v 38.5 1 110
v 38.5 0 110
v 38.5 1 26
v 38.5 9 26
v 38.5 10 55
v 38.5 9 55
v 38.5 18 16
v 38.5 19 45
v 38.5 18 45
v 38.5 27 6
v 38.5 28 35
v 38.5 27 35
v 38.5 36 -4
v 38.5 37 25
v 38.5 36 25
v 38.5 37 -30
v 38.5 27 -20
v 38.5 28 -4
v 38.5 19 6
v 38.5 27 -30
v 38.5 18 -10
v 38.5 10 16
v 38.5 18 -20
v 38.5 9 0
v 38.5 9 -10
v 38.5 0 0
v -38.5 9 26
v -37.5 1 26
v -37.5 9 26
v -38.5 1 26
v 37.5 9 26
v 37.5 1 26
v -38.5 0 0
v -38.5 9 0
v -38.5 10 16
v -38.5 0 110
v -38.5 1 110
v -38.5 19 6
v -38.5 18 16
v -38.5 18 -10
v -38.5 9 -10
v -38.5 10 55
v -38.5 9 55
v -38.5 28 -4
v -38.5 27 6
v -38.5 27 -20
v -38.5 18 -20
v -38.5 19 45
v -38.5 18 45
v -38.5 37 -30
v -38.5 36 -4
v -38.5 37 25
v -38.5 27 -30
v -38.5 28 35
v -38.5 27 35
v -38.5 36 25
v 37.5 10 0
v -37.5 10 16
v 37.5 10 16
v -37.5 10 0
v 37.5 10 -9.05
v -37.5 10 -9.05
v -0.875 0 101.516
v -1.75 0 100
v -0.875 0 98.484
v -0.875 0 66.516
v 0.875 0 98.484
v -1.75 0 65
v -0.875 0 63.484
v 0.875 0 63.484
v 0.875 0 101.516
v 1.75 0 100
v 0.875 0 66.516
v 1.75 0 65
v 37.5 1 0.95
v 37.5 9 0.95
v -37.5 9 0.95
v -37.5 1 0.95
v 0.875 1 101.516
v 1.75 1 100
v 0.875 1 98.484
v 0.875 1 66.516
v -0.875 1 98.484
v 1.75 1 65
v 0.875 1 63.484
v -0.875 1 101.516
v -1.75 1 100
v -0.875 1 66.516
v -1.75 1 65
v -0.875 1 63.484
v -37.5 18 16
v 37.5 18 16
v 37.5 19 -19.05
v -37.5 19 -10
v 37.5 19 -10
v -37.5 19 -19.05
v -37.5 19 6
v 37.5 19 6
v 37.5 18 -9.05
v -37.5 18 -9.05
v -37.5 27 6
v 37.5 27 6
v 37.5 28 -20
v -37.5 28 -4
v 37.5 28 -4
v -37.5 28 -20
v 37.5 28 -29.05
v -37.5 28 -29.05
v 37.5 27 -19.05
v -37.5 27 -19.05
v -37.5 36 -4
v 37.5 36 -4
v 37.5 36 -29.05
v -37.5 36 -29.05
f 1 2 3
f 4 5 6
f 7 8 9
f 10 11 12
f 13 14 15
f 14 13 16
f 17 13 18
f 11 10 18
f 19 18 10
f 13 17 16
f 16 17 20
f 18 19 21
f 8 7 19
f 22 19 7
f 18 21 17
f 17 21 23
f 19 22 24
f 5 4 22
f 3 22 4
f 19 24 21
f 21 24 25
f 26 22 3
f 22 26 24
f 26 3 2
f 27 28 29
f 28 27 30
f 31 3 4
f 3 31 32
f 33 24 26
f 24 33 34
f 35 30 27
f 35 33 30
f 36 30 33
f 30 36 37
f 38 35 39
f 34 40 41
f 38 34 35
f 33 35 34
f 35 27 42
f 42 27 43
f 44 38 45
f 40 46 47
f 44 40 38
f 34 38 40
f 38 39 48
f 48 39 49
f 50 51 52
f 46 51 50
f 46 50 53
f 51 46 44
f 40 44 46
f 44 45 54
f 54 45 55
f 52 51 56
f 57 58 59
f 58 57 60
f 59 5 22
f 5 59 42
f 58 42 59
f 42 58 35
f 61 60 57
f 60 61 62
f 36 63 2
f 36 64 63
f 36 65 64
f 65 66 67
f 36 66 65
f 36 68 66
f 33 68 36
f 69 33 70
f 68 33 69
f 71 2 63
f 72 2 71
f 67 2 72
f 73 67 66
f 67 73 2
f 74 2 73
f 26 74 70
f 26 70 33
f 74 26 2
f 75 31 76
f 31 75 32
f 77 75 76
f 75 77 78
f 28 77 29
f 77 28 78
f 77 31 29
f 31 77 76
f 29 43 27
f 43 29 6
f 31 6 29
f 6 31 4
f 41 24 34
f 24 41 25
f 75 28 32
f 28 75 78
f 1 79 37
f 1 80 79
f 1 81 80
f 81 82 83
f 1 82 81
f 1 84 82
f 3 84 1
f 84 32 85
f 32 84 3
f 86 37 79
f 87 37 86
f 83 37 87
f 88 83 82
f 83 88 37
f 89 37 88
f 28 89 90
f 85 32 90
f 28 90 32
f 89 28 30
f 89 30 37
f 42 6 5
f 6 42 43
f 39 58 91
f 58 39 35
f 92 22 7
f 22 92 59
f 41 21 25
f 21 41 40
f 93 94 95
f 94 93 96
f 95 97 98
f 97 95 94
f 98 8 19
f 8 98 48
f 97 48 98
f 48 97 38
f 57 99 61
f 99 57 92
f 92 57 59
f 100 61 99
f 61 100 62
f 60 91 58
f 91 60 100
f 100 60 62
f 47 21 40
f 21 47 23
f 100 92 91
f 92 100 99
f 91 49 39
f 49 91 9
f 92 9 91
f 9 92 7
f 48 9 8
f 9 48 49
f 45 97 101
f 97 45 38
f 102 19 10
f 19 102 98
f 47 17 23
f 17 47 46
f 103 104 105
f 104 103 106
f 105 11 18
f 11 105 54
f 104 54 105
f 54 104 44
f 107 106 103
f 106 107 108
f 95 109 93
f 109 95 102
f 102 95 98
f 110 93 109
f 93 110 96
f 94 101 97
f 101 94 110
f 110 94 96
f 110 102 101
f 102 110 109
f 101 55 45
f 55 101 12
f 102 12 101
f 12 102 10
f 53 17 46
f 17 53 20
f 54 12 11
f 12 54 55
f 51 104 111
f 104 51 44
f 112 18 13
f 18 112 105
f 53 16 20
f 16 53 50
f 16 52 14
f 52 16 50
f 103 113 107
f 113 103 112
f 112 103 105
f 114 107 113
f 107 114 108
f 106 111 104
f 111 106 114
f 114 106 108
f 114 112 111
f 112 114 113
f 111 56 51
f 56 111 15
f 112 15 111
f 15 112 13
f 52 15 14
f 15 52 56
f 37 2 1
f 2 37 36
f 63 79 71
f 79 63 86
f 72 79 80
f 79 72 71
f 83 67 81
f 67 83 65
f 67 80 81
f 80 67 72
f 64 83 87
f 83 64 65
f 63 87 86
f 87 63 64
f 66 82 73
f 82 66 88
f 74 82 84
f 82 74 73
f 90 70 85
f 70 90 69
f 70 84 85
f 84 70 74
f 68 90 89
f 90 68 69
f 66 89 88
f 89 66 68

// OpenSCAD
slot_x=75;
slot_y=8;
slot_z=25;
slot_wall=1;

back_z=110;
lip=back_z/2;

slot_offset=10;

pad=0.1;

slots=4;

// distance from top
screws=[10,30,50];

screw=3.5;

module slot() {
    difference() {
        translate([0,0,slot_z/2+slot_wall/2])
        cube([slot_x+slot_wall*2,slot_y+slot_wall*2,slot_z+slot_wall],center=true);
        translate([0,0,slot_z/2+slot_wall])
        cube([slot_x,slot_y,slot_z+pad],center=true);
    }
    translate([-slot_wall-slot_x/2,slot_y/2])
    cube([slot_x+slot_wall*2,slot_wall,lip]);
}


for(n=[0:1:(slots-1)])
translate([0,slot_y/2+slot_wall+slot_wall*n+slot_y*n,-slot_offset*n])
slot();


difference() {
    translate([-slot_wall-slot_x/2,0])
    cube([slot_x+slot_wall*2,slot_wall,back_z]);
    screw(10);
    screw(lip-10);
}
module screw(z) {
    translate([0,-pad,back_z-z])
    rotate([-90,0,0])
    cylinder(d=screw,h=slot_wall+pad*2,$fn=6);
}
